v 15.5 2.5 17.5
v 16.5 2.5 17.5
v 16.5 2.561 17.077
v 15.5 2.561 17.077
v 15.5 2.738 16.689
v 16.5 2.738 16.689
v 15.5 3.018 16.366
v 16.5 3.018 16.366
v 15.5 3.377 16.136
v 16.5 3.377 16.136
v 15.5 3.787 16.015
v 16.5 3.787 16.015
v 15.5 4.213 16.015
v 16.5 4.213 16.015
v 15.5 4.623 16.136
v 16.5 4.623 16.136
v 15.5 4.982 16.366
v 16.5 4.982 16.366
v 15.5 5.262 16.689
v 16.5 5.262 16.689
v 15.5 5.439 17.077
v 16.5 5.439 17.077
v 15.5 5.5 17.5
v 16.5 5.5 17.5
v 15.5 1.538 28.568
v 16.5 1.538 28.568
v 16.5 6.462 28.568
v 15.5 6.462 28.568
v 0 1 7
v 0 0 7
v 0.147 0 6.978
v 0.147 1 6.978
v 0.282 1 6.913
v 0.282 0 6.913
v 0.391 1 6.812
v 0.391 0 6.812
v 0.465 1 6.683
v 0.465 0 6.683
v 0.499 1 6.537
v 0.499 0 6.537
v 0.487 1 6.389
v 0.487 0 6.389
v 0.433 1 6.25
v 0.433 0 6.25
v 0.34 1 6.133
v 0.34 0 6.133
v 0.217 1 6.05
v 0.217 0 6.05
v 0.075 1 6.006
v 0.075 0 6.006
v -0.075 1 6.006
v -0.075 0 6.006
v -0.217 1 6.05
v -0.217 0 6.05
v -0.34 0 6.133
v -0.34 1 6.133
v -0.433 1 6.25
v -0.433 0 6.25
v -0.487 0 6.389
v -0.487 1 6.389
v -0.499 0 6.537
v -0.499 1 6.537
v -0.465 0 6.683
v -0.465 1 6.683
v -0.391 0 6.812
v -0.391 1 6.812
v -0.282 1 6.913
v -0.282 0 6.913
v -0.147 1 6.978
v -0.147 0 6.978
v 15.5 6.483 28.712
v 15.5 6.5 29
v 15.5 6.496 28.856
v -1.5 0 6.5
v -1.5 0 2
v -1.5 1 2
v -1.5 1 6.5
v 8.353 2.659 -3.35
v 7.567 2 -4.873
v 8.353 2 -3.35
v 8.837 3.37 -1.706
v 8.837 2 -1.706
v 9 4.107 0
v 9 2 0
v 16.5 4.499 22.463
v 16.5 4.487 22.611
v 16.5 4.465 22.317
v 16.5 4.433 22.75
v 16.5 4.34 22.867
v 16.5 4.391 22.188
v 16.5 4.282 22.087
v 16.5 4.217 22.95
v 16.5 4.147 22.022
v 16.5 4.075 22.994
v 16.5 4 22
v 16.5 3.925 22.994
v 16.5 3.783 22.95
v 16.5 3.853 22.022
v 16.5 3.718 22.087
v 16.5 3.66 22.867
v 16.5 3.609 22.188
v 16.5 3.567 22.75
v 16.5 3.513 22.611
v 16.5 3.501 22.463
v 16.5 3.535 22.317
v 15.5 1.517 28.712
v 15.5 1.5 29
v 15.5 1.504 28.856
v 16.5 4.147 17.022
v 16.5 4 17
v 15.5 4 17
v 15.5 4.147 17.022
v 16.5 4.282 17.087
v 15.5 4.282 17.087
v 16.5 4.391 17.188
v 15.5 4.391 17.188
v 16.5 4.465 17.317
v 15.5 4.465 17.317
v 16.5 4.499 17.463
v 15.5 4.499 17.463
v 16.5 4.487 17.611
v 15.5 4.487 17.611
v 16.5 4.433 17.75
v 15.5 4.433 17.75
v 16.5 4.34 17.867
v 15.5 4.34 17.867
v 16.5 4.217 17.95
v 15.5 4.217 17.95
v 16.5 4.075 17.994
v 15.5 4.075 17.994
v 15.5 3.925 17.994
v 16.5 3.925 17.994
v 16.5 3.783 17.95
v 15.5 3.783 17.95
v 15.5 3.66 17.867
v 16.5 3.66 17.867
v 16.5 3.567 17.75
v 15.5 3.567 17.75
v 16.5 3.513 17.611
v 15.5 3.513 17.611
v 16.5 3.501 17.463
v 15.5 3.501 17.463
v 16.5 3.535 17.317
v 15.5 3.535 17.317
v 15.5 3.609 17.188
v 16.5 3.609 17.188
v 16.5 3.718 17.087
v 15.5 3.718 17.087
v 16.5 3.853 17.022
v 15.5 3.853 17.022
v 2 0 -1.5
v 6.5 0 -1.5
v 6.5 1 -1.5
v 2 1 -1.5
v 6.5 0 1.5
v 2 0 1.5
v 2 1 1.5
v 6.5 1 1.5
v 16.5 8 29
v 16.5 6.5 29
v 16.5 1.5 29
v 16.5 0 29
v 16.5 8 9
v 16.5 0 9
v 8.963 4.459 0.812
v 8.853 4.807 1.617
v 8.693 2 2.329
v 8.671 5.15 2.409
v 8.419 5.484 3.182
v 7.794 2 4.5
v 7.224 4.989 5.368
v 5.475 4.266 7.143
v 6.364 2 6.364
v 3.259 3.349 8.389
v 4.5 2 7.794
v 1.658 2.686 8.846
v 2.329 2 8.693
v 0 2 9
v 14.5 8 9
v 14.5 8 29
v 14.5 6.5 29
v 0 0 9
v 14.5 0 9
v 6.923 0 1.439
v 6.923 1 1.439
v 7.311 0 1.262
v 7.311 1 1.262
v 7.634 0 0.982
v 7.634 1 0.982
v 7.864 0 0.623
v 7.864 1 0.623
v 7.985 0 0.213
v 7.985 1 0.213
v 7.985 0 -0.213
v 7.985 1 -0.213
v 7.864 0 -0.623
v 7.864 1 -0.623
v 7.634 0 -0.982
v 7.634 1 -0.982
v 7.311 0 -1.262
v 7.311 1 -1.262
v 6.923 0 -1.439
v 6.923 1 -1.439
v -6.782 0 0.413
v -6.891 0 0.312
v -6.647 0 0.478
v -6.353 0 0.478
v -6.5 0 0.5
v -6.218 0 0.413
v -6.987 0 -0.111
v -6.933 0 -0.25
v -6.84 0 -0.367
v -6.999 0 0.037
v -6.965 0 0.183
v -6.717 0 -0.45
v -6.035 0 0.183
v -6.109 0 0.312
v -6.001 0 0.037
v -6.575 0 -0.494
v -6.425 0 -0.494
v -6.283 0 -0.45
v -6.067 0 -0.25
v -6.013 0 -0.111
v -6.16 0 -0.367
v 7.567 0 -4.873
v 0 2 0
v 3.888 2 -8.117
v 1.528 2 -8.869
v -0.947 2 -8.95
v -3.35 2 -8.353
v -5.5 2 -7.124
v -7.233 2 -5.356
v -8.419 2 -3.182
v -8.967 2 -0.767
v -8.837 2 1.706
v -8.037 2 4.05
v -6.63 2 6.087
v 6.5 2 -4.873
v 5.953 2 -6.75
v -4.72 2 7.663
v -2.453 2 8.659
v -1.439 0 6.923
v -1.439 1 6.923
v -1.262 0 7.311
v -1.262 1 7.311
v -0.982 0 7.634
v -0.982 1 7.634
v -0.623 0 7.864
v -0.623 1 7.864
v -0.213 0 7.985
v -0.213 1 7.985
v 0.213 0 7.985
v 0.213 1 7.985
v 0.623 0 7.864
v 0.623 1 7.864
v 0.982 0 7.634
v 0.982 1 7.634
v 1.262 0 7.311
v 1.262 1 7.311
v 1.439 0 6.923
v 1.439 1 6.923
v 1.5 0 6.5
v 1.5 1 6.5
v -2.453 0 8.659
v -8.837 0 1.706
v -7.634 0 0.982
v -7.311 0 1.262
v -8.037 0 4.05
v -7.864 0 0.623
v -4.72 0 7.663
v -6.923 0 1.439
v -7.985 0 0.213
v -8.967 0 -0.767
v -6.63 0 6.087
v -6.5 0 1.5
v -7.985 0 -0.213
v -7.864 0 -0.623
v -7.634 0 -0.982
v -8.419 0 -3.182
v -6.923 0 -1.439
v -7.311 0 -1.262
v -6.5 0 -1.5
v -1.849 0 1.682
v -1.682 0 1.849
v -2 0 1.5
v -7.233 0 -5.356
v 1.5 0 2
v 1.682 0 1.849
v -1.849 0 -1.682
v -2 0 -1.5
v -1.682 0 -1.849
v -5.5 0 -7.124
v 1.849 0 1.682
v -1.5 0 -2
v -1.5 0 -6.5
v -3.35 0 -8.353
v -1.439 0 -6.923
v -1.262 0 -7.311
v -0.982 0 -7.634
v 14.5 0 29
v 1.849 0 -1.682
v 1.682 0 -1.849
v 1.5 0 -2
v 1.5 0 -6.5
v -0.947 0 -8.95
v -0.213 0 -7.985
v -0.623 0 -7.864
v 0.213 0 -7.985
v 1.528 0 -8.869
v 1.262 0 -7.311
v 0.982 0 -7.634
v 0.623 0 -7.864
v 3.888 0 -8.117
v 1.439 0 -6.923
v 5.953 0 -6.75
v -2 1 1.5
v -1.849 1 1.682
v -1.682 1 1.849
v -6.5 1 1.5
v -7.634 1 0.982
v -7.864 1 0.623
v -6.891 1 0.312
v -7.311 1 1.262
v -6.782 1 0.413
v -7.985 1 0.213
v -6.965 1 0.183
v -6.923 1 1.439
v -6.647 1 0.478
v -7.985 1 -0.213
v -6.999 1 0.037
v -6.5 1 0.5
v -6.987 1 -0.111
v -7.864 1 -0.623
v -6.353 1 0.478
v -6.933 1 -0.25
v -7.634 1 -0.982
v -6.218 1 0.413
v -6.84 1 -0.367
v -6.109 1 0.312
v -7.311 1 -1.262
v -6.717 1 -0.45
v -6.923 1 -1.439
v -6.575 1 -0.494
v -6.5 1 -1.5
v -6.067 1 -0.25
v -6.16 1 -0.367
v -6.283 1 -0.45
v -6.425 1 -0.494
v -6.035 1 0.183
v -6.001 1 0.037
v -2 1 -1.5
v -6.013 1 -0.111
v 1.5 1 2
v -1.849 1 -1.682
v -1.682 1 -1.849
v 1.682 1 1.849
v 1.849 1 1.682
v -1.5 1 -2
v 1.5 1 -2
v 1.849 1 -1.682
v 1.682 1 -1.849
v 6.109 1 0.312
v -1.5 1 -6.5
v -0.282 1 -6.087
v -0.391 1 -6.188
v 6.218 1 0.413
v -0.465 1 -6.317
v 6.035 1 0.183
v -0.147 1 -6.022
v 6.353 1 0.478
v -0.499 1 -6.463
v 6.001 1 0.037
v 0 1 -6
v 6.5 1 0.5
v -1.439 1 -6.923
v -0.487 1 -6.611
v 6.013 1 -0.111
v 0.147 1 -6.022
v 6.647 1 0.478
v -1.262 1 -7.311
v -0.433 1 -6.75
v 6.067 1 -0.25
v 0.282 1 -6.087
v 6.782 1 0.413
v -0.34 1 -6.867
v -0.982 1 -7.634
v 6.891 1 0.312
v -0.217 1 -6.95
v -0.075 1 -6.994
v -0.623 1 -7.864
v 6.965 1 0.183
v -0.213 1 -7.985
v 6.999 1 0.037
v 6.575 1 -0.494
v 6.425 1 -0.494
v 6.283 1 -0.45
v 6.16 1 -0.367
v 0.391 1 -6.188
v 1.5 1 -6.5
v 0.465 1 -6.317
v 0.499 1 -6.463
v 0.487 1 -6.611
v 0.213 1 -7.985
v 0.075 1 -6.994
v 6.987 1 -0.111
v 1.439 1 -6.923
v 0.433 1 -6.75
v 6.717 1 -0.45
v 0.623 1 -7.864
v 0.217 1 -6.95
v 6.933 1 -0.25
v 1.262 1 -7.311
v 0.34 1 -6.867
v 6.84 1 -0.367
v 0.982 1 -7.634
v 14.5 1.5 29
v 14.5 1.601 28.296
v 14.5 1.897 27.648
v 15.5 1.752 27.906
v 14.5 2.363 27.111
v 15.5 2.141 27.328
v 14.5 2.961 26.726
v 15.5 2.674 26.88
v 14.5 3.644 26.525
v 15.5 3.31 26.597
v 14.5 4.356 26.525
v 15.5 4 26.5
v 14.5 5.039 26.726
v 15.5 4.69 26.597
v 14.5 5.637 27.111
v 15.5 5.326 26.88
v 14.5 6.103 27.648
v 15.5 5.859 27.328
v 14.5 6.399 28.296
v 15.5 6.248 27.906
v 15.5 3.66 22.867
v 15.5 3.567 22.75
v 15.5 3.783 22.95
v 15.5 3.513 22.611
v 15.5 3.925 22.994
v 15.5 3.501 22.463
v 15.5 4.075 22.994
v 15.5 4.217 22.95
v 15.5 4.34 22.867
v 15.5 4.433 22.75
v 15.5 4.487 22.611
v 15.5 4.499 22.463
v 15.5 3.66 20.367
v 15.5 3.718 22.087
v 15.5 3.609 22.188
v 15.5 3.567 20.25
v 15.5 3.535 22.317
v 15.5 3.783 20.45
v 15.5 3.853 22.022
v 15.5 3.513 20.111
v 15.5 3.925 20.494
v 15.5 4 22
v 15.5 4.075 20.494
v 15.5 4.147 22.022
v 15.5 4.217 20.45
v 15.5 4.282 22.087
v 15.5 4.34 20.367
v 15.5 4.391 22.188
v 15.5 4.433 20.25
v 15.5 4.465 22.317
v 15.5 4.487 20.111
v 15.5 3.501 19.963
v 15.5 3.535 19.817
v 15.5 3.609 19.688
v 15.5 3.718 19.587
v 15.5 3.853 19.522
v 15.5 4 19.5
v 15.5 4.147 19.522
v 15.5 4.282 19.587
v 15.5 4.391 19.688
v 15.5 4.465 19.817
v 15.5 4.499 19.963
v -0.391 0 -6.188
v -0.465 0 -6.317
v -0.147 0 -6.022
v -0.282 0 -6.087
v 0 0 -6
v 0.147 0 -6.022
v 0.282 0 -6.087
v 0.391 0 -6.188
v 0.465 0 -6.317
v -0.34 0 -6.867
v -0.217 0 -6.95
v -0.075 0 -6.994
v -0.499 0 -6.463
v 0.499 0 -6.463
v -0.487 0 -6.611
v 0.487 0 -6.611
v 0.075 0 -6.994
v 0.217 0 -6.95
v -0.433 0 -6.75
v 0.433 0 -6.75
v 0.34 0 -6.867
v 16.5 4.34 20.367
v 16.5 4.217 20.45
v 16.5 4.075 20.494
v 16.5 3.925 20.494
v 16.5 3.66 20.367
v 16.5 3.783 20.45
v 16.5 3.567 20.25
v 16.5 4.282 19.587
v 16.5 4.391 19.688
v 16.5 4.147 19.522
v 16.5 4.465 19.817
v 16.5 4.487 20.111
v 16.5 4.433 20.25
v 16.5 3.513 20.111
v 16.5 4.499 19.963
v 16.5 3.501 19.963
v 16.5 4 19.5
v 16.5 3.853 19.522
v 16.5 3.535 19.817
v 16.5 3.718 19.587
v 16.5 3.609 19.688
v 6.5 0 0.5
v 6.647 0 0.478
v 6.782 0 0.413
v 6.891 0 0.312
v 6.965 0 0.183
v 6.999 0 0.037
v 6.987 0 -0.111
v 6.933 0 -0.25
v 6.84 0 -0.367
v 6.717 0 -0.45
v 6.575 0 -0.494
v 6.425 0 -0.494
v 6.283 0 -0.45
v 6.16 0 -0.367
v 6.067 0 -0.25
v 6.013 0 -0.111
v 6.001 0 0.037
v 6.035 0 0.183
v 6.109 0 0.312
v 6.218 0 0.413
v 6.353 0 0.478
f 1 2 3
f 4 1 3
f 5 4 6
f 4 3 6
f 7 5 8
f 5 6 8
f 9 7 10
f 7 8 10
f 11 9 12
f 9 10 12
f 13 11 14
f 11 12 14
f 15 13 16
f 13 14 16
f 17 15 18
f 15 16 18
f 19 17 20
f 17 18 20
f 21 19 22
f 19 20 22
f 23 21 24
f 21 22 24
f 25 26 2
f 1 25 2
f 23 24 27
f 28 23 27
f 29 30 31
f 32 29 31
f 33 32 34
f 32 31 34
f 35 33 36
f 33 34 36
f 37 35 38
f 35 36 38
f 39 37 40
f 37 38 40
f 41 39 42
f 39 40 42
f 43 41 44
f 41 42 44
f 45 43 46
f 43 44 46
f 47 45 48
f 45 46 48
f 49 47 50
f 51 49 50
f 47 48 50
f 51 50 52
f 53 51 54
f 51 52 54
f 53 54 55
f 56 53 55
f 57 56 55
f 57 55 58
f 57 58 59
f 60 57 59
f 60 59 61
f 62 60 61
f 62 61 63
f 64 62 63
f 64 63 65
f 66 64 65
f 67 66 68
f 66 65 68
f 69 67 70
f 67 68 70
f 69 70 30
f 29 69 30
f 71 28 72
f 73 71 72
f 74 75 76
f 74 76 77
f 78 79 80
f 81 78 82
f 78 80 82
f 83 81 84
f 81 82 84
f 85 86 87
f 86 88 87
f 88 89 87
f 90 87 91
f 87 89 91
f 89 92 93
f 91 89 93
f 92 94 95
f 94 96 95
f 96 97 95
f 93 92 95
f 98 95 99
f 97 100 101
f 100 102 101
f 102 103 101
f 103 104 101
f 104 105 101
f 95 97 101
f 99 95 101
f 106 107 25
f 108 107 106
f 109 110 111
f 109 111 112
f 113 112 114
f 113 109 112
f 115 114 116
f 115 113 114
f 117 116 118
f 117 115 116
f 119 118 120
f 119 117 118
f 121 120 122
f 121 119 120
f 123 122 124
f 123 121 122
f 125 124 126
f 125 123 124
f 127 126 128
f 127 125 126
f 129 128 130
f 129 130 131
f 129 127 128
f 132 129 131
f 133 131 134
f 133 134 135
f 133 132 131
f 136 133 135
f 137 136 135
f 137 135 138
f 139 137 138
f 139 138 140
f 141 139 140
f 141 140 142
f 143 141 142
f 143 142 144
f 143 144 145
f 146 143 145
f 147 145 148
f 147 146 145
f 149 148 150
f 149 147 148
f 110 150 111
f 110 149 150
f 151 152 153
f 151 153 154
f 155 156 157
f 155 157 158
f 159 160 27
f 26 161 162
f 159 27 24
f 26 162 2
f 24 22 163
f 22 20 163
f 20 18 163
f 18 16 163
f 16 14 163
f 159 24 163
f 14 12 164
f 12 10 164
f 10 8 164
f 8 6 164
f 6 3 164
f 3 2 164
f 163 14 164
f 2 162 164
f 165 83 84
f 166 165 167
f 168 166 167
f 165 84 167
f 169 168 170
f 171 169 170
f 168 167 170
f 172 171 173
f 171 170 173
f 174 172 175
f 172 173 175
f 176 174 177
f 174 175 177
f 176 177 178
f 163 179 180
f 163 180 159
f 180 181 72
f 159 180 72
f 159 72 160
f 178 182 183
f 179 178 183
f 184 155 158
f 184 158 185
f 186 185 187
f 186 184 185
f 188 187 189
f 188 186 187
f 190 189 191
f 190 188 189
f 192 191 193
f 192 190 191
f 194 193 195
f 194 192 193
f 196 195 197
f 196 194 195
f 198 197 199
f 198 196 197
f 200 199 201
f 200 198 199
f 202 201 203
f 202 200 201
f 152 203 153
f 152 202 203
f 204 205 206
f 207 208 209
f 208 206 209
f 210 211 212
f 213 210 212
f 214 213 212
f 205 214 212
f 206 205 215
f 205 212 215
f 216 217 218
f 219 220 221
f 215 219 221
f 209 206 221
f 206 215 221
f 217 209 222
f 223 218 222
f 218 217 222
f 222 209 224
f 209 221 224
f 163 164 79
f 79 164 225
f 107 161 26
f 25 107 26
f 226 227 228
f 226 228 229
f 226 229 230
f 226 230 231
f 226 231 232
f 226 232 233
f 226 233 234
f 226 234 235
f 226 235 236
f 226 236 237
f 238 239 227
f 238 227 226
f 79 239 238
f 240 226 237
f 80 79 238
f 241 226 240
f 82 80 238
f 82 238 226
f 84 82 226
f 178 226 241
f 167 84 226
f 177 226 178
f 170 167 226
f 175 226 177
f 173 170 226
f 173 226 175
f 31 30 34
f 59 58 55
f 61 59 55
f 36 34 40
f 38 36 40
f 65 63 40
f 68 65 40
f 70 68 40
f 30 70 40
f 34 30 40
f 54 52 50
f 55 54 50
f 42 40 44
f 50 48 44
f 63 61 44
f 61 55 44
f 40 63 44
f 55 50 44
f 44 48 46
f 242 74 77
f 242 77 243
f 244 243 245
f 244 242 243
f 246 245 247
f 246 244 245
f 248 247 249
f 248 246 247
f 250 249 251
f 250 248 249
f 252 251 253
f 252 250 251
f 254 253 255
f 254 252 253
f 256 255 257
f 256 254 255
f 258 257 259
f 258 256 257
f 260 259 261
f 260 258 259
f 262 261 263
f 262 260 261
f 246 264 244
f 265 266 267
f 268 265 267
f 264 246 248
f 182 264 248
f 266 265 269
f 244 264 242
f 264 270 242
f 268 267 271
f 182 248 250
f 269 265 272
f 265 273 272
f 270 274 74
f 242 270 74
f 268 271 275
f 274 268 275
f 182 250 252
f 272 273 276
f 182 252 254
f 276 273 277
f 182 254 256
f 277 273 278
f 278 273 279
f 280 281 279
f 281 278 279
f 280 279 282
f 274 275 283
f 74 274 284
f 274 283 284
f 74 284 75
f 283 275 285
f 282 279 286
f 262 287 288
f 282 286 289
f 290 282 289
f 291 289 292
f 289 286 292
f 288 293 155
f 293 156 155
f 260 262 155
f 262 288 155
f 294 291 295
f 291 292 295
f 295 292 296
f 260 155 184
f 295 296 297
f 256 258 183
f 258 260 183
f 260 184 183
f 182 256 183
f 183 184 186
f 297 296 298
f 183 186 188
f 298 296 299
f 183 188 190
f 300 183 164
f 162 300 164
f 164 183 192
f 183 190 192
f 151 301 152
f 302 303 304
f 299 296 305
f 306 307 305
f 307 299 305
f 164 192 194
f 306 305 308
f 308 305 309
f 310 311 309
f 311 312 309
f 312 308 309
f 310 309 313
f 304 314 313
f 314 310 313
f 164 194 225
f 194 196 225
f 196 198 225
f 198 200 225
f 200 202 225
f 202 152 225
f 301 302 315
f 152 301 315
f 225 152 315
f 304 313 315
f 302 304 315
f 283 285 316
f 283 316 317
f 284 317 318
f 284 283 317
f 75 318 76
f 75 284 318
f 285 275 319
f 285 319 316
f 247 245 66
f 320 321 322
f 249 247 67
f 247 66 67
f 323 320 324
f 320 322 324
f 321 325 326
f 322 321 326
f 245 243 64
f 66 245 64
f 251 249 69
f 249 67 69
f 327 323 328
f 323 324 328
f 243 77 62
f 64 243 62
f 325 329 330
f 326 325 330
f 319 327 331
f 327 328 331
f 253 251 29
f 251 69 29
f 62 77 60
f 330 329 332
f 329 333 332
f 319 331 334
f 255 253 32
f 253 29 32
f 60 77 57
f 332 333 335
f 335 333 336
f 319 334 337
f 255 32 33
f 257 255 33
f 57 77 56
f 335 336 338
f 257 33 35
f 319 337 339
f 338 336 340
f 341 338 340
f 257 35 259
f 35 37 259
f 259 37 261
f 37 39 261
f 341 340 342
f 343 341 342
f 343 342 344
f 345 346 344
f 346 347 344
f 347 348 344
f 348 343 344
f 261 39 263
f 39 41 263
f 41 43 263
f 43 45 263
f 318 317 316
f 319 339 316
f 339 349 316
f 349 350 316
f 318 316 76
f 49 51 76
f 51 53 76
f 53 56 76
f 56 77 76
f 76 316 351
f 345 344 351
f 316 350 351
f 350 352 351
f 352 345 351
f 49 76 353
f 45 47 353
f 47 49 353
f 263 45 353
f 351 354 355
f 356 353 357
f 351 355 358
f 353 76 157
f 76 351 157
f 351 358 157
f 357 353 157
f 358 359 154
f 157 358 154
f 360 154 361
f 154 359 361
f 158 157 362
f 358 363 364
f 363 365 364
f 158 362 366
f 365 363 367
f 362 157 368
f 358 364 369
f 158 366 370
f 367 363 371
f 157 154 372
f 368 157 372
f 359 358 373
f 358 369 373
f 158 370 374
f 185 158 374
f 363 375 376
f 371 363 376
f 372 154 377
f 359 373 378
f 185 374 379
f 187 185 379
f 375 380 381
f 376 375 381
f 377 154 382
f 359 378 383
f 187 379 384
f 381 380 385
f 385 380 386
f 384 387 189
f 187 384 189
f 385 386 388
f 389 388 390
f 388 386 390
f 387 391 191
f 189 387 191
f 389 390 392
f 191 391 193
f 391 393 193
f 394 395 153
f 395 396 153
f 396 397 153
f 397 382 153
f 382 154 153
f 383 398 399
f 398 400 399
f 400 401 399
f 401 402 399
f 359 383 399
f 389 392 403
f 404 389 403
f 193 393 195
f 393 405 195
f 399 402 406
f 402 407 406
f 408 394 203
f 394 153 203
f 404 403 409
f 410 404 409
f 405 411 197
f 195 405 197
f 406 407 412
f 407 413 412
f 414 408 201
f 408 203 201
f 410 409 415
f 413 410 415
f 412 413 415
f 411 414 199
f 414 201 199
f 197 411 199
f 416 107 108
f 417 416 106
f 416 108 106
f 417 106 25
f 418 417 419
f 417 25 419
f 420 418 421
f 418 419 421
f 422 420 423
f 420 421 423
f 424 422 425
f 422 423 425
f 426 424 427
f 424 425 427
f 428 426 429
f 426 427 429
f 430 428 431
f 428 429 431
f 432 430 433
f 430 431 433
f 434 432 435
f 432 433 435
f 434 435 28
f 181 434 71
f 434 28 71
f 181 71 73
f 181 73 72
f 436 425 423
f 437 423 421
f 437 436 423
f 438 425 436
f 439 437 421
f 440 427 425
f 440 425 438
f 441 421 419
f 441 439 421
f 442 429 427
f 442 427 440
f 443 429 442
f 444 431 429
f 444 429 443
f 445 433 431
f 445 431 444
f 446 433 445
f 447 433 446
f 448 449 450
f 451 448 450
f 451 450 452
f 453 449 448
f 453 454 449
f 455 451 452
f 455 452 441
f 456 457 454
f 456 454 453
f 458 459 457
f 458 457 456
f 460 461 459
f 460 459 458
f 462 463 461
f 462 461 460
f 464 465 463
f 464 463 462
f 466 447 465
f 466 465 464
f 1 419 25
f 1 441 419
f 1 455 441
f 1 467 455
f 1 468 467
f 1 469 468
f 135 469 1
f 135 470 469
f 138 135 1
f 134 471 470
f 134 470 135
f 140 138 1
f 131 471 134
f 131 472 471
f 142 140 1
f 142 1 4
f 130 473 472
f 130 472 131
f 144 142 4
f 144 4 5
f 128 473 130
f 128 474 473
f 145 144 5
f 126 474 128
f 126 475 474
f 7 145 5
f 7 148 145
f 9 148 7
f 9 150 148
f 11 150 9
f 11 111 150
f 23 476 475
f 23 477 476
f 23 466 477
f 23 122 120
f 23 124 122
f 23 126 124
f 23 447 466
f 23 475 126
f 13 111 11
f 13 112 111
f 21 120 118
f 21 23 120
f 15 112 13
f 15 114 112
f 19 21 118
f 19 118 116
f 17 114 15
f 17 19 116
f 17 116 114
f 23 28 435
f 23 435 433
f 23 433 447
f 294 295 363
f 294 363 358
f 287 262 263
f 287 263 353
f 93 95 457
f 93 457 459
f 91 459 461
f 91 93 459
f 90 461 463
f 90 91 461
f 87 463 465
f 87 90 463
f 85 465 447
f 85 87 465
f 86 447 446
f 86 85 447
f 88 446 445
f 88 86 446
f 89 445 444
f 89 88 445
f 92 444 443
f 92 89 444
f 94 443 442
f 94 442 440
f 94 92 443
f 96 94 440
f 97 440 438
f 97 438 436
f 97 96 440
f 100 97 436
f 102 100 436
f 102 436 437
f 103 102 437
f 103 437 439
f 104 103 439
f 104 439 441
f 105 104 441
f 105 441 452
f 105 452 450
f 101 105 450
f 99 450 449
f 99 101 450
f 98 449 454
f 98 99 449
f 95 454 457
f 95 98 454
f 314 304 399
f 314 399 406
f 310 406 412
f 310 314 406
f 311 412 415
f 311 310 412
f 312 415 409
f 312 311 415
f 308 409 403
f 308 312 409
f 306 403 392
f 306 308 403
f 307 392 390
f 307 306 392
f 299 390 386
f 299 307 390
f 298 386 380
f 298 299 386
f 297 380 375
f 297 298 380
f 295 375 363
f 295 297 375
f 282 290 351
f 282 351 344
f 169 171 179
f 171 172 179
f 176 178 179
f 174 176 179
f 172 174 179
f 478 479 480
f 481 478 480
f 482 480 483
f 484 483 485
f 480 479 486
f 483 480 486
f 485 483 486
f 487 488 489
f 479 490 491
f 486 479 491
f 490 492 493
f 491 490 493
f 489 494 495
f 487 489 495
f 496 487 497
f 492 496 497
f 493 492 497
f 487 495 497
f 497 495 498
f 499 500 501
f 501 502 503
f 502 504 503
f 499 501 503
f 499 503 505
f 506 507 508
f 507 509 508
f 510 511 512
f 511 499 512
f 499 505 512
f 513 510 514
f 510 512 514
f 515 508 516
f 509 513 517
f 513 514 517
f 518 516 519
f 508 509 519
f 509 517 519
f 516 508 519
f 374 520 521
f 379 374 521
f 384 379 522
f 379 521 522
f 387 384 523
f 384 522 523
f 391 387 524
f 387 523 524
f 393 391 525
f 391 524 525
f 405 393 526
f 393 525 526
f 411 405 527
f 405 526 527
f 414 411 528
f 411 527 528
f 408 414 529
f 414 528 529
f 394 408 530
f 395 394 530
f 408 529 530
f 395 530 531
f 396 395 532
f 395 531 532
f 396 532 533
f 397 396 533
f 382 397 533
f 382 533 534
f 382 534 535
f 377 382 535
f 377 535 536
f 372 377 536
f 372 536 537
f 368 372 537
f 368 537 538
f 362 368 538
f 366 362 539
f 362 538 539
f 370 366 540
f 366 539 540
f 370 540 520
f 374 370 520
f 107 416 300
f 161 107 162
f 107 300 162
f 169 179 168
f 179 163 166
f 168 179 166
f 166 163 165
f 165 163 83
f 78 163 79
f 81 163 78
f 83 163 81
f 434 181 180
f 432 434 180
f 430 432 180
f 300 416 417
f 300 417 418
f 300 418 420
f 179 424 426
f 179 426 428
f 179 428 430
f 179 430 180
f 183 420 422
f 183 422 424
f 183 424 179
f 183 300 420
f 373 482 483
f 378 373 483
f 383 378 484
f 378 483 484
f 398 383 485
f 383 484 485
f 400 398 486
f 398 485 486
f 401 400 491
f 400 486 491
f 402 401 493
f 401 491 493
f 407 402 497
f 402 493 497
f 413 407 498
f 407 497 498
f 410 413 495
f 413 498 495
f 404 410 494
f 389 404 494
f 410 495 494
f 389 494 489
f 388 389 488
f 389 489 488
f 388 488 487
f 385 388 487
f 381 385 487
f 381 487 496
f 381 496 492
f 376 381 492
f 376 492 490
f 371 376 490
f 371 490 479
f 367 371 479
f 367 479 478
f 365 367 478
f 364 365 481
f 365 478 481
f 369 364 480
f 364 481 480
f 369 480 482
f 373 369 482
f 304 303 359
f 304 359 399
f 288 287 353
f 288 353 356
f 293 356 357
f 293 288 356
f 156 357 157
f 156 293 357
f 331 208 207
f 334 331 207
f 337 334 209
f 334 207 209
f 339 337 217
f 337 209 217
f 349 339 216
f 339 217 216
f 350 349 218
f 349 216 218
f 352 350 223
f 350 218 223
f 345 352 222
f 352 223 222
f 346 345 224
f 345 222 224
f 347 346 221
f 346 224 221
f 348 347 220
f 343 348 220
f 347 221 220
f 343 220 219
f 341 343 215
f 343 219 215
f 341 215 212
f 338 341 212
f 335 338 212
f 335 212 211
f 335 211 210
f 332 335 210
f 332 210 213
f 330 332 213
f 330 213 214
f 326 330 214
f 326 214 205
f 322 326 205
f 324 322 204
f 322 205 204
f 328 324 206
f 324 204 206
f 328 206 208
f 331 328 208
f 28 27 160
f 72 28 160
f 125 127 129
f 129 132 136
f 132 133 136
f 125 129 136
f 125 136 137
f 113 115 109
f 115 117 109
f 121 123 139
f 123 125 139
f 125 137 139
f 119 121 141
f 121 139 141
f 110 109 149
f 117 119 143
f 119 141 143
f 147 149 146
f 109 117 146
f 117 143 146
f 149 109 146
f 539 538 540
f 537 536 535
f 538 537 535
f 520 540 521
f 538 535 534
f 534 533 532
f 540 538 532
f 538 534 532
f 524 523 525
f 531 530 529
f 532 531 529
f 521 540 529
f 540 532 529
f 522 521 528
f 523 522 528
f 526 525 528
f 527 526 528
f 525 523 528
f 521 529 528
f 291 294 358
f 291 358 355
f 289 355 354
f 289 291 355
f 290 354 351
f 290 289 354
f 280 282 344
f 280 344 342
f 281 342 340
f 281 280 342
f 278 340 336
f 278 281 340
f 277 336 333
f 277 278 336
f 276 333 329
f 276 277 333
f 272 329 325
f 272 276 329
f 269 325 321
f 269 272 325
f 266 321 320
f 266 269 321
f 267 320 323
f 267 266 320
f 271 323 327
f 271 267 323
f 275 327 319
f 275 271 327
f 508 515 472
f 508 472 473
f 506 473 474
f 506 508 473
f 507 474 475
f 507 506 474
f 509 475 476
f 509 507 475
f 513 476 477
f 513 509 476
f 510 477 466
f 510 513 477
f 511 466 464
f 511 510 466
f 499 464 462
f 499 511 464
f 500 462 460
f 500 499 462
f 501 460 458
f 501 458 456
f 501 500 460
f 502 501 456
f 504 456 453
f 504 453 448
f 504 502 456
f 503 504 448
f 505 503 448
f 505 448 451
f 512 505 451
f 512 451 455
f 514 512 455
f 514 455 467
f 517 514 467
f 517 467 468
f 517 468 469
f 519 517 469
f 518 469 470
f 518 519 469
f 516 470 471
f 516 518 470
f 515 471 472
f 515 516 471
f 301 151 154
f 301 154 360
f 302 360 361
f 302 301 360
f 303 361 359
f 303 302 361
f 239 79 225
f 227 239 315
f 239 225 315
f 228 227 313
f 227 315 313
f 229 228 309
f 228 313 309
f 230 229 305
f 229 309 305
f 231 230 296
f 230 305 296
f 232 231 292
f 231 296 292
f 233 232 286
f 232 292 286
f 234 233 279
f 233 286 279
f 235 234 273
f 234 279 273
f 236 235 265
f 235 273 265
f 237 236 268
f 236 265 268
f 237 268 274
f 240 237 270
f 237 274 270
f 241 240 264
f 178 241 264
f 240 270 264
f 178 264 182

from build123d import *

# Parameters (mm, degrees)
SKETCH1_R           = 9
BOSS_EXTRUDE1_DEPTH = 2
BOSS_EXTRUDE2_DEPTH = 8
SKETCH1_5_R         = 0.5
CUT_EXTRUDE1_DEPTH  = 1
CUT_EXTRUDE2_DEPTH  = 9
SKETCH4_R           = 0.5
CUT_EXTRUDE5_DEPTH  = 1
SKETCH6_R           = 2.5
CUT_EXTRUDE6_DEPTH  = 10
CUT_EXTRUDE8_DEPTH  = 10


with BuildPart() as part:
    # Sketch1 → Boss-Extrude1 (new body)
    with BuildSketch(Plane(origin=(0, 0, 0), x_dir=(1, 0, 0), z_dir=(0, 1, 0))):
        Circle(SKETCH1_R)
    extrude(amount=BOSS_EXTRUDE1_DEPTH)

    # Sketch1<4> → Boss-Extrude2 (add)
    with BuildSketch(Plane(origin=(0, 0, 0), x_dir=(1, 0, 0), z_dir=(0, 1, 0))):
        with BuildLine():
            Line((0, -9), (14.5, -9))
            Line((14.5, -9), (14.5, -29))
            Line((14.5, -29), (16.5, -29))
            Line((16.5, -29), (16.5, -9))
            Line((16.5, -9), (7.566878981, 4.872611465))
            ThreePointArc((7.566878981, 4.872611465), (7.901060156, -4.309669176), (0, -9))
        make_face()
    extrude(amount=BOSS_EXTRUDE2_DEPTH)

    # Sketch1<5> → Cut-Extrude1 (cut)
    with BuildSketch(Plane(origin=(0, 0, 0), x_dir=(1, 0, 0), z_dir=(0, 1, 0))):
        with BuildLine():
            ThreePointArc((1.5, -2), (1.767766953, -1.767766953), (2, -1.5))
            Line((2, -1.5), (6.5, -1.5))
            ThreePointArc((6.5, -1.5), (8, 0), (6.5, 1.5))
            Line((6.5, 1.5), (2, 1.5))
            ThreePointArc((2, 1.5), (1.767766953, 1.767766953), (1.5, 2))
            Line((1.5, 2), (1.5, 6.5))
            ThreePointArc((1.5, 6.5), (0, 8), (-1.5, 6.5))
            Line((-1.5, 6.5), (-1.5, 2))
            ThreePointArc((-1.5, 2), (-1.767766953, 1.767766953), (-2, 1.5))
            Line((-2, 1.5), (-6.5, 1.5))
            ThreePointArc((-6.5, 1.5), (-8, 0), (-6.5, -1.5))
            Line((-6.5, -1.5), (-2, -1.5))
            ThreePointArc((-2, -1.5), (-1.767766953, -1.767766953), (-1.5, -2))
            Line((-1.5, -2), (-1.5, -6.5))
            ThreePointArc((-1.5, -6.5), (0, -8), (1.5, -6.5))
            Line((1.5, -6.5), (1.5, -2))
        make_face()
        with Locations((6.5, 0)):
            Circle(SKETCH1_5_R, mode=Mode.SUBTRACT)
        with Locations((0, -6.5)):
            Circle(SKETCH1_5_R, mode=Mode.SUBTRACT)
        with Locations((-6.5, 0)):
            Circle(SKETCH1_5_R, mode=Mode.SUBTRACT)
        with Locations((0, 6.5)):
            Circle(SKETCH1_5_R, mode=Mode.SUBTRACT)
    extrude(amount=CUT_EXTRUDE1_DEPTH, mode=Mode.SUBTRACT)

    # Sketch2 → Cut-Extrude2 (cut)
    with BuildSketch(Plane.XY.offset(9)):
        Polygon((0, 2), (14.5, 8), (0, 8), align=None)
    extrude(amount=-CUT_EXTRUDE2_DEPTH, mode=Mode.SUBTRACT)

    # Sketch4 → Cut-Extrude5 (cut)
    with BuildSketch(Plane(origin=(16.5, 0, 0), x_dir=(0, 0, -1), z_dir=(1, 0, 0))):
        with BuildLine():
            Line((-29, 6.5), (-29, 1.5))
            Line((-29, 1.5), (-17.5, 2.5))
            ThreePointArc((-17.5, 2.5), (-16, 4), (-17.5, 5.5))
            Line((-17.5, 5.5), (-29, 6.5))
        make_face()
        with Locations((-22.5, 4)):
            Circle(SKETCH4_R, mode=Mode.SUBTRACT)
        with Locations((-20, 4)):
            Circle(SKETCH4_R, mode=Mode.SUBTRACT)
        with Locations((-17.5, 4)):
            Circle(SKETCH4_R, mode=Mode.SUBTRACT)
    extrude(amount=-CUT_EXTRUDE5_DEPTH, mode=Mode.SUBTRACT)

    # Sketch6 → Cut-Extrude6 (cut)
    with BuildSketch(Plane(origin=(15.5, 0, 0), x_dir=(0, 0, -1), z_dir=(1, 0, 0))):
        with Locations((-29, 4)):
            Circle(SKETCH6_R)
    extrude(amount=-CUT_EXTRUDE6_DEPTH, mode=Mode.SUBTRACT)

    # Sketch8 → Cut-Extrude8 (cut)
    with BuildSketch(Plane(origin=(16.5, 0, 0), x_dir=(0, 0, -1), z_dir=(1, 0, 0))):
        Polygon((-9, 8), (4.872611465, 2), (4.872611465, 8), align=None)
    extrude(amount=-CUT_EXTRUDE8_DEPTH, mode=Mode.SUBTRACT)


solid = part.part
